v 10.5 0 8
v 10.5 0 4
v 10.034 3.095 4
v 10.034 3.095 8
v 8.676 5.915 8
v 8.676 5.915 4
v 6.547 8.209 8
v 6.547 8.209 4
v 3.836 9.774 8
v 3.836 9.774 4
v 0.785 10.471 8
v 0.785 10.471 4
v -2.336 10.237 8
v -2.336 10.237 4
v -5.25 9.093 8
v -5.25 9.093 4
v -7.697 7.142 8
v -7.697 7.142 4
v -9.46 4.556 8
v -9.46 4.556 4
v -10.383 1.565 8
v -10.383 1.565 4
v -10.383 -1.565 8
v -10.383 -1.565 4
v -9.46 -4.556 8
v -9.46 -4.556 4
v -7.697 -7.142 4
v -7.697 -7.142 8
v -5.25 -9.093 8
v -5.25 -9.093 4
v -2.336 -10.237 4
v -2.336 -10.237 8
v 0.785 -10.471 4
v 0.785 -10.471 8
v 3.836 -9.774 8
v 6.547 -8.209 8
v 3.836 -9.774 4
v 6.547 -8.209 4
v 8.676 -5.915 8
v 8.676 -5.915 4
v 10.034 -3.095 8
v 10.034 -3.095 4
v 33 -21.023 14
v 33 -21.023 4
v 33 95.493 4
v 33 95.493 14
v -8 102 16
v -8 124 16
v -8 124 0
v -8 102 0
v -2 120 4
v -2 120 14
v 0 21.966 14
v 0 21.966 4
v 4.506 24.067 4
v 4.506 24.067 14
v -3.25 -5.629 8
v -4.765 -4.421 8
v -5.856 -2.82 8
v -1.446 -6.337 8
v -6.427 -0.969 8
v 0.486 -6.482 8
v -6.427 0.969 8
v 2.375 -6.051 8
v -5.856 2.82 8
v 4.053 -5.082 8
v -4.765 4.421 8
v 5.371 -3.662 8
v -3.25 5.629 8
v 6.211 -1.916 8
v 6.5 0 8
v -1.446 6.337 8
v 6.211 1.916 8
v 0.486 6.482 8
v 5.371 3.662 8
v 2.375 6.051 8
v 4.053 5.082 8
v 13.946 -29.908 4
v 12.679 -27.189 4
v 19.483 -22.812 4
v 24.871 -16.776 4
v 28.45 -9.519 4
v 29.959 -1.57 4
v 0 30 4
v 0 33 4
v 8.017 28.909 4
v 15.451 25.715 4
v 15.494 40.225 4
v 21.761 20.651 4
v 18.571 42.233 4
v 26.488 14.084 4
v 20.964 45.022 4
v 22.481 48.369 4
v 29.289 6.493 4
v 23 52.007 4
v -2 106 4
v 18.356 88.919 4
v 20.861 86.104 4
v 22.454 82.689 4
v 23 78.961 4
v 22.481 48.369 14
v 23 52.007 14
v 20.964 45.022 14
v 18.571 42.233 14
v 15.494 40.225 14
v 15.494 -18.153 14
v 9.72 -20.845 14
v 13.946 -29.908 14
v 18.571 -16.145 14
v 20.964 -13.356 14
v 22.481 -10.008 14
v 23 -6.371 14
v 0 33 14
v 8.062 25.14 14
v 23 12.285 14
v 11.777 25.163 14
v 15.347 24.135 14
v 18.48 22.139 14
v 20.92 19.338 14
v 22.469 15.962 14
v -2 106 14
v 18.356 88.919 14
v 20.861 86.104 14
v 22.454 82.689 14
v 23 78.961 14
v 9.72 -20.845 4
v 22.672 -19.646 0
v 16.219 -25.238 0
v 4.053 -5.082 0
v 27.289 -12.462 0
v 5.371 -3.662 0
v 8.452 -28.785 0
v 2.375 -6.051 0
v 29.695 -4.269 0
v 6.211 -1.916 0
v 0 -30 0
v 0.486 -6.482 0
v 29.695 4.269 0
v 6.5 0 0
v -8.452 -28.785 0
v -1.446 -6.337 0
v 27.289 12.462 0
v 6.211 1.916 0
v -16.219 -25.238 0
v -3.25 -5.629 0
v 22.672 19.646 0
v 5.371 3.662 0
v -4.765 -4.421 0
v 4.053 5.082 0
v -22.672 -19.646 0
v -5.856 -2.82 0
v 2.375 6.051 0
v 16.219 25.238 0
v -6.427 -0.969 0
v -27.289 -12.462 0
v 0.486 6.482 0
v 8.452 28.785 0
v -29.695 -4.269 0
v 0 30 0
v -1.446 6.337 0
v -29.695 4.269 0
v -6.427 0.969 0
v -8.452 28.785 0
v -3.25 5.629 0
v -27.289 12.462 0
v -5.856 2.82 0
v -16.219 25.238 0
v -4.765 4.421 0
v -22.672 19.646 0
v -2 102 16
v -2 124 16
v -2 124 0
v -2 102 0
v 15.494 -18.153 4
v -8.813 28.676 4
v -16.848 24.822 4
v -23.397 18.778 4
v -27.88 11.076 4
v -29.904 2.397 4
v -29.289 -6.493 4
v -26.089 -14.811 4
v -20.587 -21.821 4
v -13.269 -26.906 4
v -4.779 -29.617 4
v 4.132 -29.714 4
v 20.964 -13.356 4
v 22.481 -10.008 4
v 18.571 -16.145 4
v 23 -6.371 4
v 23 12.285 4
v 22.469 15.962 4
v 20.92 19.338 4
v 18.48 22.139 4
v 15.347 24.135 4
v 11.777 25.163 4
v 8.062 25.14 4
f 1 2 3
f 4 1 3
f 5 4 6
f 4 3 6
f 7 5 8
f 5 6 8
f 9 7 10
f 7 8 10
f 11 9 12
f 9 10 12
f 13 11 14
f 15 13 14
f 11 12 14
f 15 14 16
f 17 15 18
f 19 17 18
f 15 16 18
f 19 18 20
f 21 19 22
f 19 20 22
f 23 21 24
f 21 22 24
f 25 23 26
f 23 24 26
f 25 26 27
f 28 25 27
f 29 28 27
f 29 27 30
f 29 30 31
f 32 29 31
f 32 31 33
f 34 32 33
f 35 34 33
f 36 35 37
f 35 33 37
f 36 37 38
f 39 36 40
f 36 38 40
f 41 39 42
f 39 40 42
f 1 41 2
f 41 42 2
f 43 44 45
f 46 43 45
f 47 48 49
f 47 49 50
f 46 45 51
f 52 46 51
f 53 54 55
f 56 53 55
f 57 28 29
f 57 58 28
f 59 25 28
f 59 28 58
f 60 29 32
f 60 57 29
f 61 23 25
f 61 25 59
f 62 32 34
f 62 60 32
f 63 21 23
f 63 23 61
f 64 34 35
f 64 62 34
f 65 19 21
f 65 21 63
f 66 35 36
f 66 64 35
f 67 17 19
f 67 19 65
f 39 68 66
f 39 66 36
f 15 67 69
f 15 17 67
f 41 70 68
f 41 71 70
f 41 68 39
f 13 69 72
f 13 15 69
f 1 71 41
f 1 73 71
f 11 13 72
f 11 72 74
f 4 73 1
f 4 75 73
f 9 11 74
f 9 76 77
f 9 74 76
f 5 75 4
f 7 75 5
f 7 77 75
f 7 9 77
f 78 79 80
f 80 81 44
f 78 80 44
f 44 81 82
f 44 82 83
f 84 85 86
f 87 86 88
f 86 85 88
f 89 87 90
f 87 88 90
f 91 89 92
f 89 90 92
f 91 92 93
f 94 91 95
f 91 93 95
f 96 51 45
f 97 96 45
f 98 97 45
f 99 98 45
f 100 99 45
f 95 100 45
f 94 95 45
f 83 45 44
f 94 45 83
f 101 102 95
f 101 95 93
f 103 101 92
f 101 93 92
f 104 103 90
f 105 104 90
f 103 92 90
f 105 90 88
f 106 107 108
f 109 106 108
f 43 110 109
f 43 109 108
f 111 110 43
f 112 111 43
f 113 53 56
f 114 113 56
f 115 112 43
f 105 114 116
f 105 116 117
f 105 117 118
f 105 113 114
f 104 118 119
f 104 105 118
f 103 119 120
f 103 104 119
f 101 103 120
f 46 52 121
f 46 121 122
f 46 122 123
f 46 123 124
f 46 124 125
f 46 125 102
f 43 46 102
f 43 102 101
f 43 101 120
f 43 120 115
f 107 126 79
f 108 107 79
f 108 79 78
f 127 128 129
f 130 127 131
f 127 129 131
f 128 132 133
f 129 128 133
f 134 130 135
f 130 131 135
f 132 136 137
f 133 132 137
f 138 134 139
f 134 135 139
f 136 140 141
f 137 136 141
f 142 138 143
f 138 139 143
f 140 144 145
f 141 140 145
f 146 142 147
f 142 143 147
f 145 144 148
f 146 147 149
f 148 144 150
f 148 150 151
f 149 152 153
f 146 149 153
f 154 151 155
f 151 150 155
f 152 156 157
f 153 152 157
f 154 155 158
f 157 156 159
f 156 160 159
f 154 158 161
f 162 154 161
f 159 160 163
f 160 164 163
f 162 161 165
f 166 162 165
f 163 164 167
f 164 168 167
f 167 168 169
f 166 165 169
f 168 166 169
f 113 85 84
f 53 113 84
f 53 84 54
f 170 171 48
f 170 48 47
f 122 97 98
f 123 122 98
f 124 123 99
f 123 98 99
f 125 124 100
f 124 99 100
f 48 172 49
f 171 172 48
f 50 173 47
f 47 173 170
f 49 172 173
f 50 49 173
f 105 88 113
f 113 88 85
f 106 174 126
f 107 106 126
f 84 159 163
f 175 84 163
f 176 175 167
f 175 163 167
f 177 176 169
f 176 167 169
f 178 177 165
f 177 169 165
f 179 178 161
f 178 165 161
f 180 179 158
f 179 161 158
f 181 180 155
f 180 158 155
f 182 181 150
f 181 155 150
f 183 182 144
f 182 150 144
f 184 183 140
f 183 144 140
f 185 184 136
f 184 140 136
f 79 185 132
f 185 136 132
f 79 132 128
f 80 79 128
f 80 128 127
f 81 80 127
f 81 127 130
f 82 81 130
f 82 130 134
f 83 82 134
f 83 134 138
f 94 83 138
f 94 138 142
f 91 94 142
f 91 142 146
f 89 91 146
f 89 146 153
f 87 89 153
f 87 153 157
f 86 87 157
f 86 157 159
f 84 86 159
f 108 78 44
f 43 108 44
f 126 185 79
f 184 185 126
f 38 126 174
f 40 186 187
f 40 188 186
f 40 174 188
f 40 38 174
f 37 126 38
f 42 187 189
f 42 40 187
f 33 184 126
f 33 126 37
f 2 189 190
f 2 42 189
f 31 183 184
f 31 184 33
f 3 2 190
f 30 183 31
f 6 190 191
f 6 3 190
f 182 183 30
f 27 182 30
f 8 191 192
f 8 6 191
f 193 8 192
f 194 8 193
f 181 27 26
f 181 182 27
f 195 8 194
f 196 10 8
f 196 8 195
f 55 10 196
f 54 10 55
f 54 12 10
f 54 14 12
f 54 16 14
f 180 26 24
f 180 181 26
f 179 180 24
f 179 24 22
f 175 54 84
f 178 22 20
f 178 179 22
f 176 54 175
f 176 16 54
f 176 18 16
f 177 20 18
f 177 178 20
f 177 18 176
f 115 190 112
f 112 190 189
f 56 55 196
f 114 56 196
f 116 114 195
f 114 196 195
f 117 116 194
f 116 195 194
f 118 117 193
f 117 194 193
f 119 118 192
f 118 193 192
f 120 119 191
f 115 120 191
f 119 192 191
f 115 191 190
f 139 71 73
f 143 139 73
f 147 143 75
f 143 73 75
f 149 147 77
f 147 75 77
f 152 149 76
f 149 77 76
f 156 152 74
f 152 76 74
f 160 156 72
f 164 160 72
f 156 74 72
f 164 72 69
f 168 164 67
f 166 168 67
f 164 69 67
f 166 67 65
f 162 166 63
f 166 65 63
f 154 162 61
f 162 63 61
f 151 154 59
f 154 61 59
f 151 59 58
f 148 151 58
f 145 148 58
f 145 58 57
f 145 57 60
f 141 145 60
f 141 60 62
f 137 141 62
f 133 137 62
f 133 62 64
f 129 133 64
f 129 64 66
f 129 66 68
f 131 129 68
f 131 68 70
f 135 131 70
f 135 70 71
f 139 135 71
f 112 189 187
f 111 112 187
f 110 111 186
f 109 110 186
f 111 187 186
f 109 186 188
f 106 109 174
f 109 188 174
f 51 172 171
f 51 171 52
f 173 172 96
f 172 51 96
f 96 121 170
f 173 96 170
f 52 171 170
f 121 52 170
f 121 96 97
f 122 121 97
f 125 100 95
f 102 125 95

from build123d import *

# Parameters (mm, degrees)
SKETCH1_R               = 30
BOSS_EXTRUDE1_DEPTH     = 4
BOSS_EXTRUDE2_DEPTH     = 10
SKETCH3_W               = 22
SKETCH3_H               = 16
BOSS_EXTRUDE3_DEPTH     = 6
SKETCH5_R               = 10.5
BOSS_EXTRUDE4_DEPTH     = 4
SKETCH7_R               = 6.5
CUT_EXTRUDE3_DEPTH      = 9
CUT_EXTRUDE3_DEPTH_BACK = 9


with BuildPart() as part:
    # Sketch1 → Boss-Extrude1 (new body)
    with BuildSketch(Plane(origin=(0, 0, 0), x_dir=(0, 1, 0), z_dir=(0, 0, 1))):
        Circle(SKETCH1_R)
    extrude(amount=BOSS_EXTRUDE1_DEPTH)

    # Sketch2 → Boss-Extrude2 (add)
    with BuildSketch(Plane.XY.offset(4)):
        with BuildLine():
            Line((9.72022002, -20.845079102), (13.946402637, -29.908156972))
            Line((13.946402637, -29.908156972), (33, -21.023318607))
            Line((33, -21.023318607), (33, 95.492736163))
            Line((33, 95.492736163), (-2, 120))
            Line((-2, 120), (-2, 106))
            Line((-2, 106), (18.356238926, 88.919087425))
            ThreePointArc((18.356238926, 88.919087425), (21.782001231, 84.454547067), (23, 78.960509665))
            Line((23, 78.960509665), (23, 52.006989528))
            ThreePointArc((23, 52.006989528), (20.964088796, 45.02209462), (15.494037403, 40.224988297))
            Line((15.494037403, 40.224988297), (0, 33))
            Line((0, 33), (0, 21.96622081))
            Line((0, 21.96622081), (4.505962597, 24.067385677))
            ThreePointArc((4.505962597, 24.067385677), (16.984894909, 23.249473241), (23, 12.285384445))
            Line((23, 12.285384445), (23, -6.370702608))
            ThreePointArc((23, -6.370702608), (20.964088796, -13.355597517), (15.494037403, -18.15270384))
            Line((15.494037403, -18.15270384), (9.72022002, -20.845079102))
        make_face()
    extrude(amount=BOSS_EXTRUDE2_DEPTH)

    # Sketch3 → Boss-Extrude3 (add)
    with BuildSketch(Plane(origin=(-2, 0, 0), x_dir=(0, -1, 0), z_dir=(-1, 0, 0))):
        with Locations((-113, 8)):
            Rectangle(SKETCH3_W, SKETCH3_H)
    extrude(amount=BOSS_EXTRUDE3_DEPTH)

    # Sketch5 → Boss-Extrude4 (add)
    with BuildSketch(Plane.XY.offset(4)):
        Circle(SKETCH5_R)
    extrude(amount=BOSS_EXTRUDE4_DEPTH)

    # Sketch7 → Cut-Extrude3 (cut, two sides)
    with BuildSketch(Plane.XY.offset(8)) as cut_extrude3_sk:
        Circle(SKETCH7_R)
    extrude(amount=CUT_EXTRUDE3_DEPTH, mode=Mode.SUBTRACT)
    extrude(cut_extrude3_sk.sketch, amount=-CUT_EXTRUDE3_DEPTH_BACK, mode=Mode.SUBTRACT)


solid = part.part
